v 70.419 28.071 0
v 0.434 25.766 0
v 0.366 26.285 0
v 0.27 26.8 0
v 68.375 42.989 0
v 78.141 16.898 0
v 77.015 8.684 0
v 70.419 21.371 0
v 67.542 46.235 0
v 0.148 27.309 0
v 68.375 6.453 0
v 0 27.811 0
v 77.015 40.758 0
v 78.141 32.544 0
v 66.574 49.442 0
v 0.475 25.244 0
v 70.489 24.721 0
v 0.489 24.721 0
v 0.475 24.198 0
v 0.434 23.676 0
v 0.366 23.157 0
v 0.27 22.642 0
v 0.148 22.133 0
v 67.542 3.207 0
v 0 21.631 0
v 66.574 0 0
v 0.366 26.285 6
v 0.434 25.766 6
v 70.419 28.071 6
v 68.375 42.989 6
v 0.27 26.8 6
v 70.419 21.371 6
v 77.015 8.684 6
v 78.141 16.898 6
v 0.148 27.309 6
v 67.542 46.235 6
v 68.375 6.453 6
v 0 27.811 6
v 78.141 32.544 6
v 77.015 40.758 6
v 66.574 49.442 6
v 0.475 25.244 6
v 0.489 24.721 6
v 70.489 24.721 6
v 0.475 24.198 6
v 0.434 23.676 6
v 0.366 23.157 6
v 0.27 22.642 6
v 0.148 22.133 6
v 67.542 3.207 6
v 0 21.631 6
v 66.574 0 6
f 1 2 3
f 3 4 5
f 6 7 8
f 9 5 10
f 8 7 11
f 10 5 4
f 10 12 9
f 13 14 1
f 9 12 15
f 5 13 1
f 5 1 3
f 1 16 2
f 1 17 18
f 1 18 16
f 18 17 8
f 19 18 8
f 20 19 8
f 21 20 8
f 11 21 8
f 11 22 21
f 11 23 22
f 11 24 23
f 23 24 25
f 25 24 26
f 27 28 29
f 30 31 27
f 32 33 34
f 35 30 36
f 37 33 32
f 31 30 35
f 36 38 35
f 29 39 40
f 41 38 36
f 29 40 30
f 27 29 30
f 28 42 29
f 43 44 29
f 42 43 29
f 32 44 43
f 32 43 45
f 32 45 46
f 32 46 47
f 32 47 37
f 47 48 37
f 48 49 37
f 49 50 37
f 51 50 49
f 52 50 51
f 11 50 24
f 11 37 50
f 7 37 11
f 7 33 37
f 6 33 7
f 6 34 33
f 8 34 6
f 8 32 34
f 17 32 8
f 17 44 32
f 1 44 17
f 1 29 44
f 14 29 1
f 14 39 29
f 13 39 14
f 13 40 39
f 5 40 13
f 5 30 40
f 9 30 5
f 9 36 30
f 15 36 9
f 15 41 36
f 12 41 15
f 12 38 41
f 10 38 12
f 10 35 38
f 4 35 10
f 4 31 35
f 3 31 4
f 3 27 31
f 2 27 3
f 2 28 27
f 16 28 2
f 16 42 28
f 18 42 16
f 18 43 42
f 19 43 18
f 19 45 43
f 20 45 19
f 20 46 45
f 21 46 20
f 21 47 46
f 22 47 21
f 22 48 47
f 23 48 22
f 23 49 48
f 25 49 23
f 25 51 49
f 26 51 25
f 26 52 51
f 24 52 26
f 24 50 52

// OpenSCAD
$fn = 32;

// ----------------------------------------------------------------------
// Gear sector: 2 teeth on 36 degrees
// ----------------------------------------------------------------------

// --- parameters (mm) ---
sector_angle = 36;        // sector angle, degrees
root_r = 80;              // root circle radius
tooth_h = 8;              // tooth height over the root circle
teeth = 2;                // number of teeth on the sector
hub_r = 10;               // hub bore radius
plate_t = 6;              // sector thickness, Z
arc_step = 3;             // sampling step of the root/hub arcs, degrees

tip_r = root_r + tooth_h;  // tip circle radius

profile = [[66.574, 0], [67.542, 3.207], [68.375, 6.453], [77.015, 8.684], [78.141, 16.898], [70.419, 21.371], [70.489, 24.721], [70.419, 28.071], [78.141, 32.544], [77.015, 40.758], [68.375, 42.989], [67.542, 46.235], [66.574, 49.442], [0, 27.811], [0.148, 27.309], [0.27, 26.8], [0.366, 26.285], [0.434, 25.766], [0.475, 25.244], [0.489, 24.721], [0.475, 24.198], [0.434, 23.676], [0.366, 23.157], [0.27, 22.642], [0.148, 22.133], [0, 21.631]];  // primary outline, 26 points, counter clockwise

// --- the one profile operation ---
linear_extrude(height = plate_t) polygon(points = profile);
